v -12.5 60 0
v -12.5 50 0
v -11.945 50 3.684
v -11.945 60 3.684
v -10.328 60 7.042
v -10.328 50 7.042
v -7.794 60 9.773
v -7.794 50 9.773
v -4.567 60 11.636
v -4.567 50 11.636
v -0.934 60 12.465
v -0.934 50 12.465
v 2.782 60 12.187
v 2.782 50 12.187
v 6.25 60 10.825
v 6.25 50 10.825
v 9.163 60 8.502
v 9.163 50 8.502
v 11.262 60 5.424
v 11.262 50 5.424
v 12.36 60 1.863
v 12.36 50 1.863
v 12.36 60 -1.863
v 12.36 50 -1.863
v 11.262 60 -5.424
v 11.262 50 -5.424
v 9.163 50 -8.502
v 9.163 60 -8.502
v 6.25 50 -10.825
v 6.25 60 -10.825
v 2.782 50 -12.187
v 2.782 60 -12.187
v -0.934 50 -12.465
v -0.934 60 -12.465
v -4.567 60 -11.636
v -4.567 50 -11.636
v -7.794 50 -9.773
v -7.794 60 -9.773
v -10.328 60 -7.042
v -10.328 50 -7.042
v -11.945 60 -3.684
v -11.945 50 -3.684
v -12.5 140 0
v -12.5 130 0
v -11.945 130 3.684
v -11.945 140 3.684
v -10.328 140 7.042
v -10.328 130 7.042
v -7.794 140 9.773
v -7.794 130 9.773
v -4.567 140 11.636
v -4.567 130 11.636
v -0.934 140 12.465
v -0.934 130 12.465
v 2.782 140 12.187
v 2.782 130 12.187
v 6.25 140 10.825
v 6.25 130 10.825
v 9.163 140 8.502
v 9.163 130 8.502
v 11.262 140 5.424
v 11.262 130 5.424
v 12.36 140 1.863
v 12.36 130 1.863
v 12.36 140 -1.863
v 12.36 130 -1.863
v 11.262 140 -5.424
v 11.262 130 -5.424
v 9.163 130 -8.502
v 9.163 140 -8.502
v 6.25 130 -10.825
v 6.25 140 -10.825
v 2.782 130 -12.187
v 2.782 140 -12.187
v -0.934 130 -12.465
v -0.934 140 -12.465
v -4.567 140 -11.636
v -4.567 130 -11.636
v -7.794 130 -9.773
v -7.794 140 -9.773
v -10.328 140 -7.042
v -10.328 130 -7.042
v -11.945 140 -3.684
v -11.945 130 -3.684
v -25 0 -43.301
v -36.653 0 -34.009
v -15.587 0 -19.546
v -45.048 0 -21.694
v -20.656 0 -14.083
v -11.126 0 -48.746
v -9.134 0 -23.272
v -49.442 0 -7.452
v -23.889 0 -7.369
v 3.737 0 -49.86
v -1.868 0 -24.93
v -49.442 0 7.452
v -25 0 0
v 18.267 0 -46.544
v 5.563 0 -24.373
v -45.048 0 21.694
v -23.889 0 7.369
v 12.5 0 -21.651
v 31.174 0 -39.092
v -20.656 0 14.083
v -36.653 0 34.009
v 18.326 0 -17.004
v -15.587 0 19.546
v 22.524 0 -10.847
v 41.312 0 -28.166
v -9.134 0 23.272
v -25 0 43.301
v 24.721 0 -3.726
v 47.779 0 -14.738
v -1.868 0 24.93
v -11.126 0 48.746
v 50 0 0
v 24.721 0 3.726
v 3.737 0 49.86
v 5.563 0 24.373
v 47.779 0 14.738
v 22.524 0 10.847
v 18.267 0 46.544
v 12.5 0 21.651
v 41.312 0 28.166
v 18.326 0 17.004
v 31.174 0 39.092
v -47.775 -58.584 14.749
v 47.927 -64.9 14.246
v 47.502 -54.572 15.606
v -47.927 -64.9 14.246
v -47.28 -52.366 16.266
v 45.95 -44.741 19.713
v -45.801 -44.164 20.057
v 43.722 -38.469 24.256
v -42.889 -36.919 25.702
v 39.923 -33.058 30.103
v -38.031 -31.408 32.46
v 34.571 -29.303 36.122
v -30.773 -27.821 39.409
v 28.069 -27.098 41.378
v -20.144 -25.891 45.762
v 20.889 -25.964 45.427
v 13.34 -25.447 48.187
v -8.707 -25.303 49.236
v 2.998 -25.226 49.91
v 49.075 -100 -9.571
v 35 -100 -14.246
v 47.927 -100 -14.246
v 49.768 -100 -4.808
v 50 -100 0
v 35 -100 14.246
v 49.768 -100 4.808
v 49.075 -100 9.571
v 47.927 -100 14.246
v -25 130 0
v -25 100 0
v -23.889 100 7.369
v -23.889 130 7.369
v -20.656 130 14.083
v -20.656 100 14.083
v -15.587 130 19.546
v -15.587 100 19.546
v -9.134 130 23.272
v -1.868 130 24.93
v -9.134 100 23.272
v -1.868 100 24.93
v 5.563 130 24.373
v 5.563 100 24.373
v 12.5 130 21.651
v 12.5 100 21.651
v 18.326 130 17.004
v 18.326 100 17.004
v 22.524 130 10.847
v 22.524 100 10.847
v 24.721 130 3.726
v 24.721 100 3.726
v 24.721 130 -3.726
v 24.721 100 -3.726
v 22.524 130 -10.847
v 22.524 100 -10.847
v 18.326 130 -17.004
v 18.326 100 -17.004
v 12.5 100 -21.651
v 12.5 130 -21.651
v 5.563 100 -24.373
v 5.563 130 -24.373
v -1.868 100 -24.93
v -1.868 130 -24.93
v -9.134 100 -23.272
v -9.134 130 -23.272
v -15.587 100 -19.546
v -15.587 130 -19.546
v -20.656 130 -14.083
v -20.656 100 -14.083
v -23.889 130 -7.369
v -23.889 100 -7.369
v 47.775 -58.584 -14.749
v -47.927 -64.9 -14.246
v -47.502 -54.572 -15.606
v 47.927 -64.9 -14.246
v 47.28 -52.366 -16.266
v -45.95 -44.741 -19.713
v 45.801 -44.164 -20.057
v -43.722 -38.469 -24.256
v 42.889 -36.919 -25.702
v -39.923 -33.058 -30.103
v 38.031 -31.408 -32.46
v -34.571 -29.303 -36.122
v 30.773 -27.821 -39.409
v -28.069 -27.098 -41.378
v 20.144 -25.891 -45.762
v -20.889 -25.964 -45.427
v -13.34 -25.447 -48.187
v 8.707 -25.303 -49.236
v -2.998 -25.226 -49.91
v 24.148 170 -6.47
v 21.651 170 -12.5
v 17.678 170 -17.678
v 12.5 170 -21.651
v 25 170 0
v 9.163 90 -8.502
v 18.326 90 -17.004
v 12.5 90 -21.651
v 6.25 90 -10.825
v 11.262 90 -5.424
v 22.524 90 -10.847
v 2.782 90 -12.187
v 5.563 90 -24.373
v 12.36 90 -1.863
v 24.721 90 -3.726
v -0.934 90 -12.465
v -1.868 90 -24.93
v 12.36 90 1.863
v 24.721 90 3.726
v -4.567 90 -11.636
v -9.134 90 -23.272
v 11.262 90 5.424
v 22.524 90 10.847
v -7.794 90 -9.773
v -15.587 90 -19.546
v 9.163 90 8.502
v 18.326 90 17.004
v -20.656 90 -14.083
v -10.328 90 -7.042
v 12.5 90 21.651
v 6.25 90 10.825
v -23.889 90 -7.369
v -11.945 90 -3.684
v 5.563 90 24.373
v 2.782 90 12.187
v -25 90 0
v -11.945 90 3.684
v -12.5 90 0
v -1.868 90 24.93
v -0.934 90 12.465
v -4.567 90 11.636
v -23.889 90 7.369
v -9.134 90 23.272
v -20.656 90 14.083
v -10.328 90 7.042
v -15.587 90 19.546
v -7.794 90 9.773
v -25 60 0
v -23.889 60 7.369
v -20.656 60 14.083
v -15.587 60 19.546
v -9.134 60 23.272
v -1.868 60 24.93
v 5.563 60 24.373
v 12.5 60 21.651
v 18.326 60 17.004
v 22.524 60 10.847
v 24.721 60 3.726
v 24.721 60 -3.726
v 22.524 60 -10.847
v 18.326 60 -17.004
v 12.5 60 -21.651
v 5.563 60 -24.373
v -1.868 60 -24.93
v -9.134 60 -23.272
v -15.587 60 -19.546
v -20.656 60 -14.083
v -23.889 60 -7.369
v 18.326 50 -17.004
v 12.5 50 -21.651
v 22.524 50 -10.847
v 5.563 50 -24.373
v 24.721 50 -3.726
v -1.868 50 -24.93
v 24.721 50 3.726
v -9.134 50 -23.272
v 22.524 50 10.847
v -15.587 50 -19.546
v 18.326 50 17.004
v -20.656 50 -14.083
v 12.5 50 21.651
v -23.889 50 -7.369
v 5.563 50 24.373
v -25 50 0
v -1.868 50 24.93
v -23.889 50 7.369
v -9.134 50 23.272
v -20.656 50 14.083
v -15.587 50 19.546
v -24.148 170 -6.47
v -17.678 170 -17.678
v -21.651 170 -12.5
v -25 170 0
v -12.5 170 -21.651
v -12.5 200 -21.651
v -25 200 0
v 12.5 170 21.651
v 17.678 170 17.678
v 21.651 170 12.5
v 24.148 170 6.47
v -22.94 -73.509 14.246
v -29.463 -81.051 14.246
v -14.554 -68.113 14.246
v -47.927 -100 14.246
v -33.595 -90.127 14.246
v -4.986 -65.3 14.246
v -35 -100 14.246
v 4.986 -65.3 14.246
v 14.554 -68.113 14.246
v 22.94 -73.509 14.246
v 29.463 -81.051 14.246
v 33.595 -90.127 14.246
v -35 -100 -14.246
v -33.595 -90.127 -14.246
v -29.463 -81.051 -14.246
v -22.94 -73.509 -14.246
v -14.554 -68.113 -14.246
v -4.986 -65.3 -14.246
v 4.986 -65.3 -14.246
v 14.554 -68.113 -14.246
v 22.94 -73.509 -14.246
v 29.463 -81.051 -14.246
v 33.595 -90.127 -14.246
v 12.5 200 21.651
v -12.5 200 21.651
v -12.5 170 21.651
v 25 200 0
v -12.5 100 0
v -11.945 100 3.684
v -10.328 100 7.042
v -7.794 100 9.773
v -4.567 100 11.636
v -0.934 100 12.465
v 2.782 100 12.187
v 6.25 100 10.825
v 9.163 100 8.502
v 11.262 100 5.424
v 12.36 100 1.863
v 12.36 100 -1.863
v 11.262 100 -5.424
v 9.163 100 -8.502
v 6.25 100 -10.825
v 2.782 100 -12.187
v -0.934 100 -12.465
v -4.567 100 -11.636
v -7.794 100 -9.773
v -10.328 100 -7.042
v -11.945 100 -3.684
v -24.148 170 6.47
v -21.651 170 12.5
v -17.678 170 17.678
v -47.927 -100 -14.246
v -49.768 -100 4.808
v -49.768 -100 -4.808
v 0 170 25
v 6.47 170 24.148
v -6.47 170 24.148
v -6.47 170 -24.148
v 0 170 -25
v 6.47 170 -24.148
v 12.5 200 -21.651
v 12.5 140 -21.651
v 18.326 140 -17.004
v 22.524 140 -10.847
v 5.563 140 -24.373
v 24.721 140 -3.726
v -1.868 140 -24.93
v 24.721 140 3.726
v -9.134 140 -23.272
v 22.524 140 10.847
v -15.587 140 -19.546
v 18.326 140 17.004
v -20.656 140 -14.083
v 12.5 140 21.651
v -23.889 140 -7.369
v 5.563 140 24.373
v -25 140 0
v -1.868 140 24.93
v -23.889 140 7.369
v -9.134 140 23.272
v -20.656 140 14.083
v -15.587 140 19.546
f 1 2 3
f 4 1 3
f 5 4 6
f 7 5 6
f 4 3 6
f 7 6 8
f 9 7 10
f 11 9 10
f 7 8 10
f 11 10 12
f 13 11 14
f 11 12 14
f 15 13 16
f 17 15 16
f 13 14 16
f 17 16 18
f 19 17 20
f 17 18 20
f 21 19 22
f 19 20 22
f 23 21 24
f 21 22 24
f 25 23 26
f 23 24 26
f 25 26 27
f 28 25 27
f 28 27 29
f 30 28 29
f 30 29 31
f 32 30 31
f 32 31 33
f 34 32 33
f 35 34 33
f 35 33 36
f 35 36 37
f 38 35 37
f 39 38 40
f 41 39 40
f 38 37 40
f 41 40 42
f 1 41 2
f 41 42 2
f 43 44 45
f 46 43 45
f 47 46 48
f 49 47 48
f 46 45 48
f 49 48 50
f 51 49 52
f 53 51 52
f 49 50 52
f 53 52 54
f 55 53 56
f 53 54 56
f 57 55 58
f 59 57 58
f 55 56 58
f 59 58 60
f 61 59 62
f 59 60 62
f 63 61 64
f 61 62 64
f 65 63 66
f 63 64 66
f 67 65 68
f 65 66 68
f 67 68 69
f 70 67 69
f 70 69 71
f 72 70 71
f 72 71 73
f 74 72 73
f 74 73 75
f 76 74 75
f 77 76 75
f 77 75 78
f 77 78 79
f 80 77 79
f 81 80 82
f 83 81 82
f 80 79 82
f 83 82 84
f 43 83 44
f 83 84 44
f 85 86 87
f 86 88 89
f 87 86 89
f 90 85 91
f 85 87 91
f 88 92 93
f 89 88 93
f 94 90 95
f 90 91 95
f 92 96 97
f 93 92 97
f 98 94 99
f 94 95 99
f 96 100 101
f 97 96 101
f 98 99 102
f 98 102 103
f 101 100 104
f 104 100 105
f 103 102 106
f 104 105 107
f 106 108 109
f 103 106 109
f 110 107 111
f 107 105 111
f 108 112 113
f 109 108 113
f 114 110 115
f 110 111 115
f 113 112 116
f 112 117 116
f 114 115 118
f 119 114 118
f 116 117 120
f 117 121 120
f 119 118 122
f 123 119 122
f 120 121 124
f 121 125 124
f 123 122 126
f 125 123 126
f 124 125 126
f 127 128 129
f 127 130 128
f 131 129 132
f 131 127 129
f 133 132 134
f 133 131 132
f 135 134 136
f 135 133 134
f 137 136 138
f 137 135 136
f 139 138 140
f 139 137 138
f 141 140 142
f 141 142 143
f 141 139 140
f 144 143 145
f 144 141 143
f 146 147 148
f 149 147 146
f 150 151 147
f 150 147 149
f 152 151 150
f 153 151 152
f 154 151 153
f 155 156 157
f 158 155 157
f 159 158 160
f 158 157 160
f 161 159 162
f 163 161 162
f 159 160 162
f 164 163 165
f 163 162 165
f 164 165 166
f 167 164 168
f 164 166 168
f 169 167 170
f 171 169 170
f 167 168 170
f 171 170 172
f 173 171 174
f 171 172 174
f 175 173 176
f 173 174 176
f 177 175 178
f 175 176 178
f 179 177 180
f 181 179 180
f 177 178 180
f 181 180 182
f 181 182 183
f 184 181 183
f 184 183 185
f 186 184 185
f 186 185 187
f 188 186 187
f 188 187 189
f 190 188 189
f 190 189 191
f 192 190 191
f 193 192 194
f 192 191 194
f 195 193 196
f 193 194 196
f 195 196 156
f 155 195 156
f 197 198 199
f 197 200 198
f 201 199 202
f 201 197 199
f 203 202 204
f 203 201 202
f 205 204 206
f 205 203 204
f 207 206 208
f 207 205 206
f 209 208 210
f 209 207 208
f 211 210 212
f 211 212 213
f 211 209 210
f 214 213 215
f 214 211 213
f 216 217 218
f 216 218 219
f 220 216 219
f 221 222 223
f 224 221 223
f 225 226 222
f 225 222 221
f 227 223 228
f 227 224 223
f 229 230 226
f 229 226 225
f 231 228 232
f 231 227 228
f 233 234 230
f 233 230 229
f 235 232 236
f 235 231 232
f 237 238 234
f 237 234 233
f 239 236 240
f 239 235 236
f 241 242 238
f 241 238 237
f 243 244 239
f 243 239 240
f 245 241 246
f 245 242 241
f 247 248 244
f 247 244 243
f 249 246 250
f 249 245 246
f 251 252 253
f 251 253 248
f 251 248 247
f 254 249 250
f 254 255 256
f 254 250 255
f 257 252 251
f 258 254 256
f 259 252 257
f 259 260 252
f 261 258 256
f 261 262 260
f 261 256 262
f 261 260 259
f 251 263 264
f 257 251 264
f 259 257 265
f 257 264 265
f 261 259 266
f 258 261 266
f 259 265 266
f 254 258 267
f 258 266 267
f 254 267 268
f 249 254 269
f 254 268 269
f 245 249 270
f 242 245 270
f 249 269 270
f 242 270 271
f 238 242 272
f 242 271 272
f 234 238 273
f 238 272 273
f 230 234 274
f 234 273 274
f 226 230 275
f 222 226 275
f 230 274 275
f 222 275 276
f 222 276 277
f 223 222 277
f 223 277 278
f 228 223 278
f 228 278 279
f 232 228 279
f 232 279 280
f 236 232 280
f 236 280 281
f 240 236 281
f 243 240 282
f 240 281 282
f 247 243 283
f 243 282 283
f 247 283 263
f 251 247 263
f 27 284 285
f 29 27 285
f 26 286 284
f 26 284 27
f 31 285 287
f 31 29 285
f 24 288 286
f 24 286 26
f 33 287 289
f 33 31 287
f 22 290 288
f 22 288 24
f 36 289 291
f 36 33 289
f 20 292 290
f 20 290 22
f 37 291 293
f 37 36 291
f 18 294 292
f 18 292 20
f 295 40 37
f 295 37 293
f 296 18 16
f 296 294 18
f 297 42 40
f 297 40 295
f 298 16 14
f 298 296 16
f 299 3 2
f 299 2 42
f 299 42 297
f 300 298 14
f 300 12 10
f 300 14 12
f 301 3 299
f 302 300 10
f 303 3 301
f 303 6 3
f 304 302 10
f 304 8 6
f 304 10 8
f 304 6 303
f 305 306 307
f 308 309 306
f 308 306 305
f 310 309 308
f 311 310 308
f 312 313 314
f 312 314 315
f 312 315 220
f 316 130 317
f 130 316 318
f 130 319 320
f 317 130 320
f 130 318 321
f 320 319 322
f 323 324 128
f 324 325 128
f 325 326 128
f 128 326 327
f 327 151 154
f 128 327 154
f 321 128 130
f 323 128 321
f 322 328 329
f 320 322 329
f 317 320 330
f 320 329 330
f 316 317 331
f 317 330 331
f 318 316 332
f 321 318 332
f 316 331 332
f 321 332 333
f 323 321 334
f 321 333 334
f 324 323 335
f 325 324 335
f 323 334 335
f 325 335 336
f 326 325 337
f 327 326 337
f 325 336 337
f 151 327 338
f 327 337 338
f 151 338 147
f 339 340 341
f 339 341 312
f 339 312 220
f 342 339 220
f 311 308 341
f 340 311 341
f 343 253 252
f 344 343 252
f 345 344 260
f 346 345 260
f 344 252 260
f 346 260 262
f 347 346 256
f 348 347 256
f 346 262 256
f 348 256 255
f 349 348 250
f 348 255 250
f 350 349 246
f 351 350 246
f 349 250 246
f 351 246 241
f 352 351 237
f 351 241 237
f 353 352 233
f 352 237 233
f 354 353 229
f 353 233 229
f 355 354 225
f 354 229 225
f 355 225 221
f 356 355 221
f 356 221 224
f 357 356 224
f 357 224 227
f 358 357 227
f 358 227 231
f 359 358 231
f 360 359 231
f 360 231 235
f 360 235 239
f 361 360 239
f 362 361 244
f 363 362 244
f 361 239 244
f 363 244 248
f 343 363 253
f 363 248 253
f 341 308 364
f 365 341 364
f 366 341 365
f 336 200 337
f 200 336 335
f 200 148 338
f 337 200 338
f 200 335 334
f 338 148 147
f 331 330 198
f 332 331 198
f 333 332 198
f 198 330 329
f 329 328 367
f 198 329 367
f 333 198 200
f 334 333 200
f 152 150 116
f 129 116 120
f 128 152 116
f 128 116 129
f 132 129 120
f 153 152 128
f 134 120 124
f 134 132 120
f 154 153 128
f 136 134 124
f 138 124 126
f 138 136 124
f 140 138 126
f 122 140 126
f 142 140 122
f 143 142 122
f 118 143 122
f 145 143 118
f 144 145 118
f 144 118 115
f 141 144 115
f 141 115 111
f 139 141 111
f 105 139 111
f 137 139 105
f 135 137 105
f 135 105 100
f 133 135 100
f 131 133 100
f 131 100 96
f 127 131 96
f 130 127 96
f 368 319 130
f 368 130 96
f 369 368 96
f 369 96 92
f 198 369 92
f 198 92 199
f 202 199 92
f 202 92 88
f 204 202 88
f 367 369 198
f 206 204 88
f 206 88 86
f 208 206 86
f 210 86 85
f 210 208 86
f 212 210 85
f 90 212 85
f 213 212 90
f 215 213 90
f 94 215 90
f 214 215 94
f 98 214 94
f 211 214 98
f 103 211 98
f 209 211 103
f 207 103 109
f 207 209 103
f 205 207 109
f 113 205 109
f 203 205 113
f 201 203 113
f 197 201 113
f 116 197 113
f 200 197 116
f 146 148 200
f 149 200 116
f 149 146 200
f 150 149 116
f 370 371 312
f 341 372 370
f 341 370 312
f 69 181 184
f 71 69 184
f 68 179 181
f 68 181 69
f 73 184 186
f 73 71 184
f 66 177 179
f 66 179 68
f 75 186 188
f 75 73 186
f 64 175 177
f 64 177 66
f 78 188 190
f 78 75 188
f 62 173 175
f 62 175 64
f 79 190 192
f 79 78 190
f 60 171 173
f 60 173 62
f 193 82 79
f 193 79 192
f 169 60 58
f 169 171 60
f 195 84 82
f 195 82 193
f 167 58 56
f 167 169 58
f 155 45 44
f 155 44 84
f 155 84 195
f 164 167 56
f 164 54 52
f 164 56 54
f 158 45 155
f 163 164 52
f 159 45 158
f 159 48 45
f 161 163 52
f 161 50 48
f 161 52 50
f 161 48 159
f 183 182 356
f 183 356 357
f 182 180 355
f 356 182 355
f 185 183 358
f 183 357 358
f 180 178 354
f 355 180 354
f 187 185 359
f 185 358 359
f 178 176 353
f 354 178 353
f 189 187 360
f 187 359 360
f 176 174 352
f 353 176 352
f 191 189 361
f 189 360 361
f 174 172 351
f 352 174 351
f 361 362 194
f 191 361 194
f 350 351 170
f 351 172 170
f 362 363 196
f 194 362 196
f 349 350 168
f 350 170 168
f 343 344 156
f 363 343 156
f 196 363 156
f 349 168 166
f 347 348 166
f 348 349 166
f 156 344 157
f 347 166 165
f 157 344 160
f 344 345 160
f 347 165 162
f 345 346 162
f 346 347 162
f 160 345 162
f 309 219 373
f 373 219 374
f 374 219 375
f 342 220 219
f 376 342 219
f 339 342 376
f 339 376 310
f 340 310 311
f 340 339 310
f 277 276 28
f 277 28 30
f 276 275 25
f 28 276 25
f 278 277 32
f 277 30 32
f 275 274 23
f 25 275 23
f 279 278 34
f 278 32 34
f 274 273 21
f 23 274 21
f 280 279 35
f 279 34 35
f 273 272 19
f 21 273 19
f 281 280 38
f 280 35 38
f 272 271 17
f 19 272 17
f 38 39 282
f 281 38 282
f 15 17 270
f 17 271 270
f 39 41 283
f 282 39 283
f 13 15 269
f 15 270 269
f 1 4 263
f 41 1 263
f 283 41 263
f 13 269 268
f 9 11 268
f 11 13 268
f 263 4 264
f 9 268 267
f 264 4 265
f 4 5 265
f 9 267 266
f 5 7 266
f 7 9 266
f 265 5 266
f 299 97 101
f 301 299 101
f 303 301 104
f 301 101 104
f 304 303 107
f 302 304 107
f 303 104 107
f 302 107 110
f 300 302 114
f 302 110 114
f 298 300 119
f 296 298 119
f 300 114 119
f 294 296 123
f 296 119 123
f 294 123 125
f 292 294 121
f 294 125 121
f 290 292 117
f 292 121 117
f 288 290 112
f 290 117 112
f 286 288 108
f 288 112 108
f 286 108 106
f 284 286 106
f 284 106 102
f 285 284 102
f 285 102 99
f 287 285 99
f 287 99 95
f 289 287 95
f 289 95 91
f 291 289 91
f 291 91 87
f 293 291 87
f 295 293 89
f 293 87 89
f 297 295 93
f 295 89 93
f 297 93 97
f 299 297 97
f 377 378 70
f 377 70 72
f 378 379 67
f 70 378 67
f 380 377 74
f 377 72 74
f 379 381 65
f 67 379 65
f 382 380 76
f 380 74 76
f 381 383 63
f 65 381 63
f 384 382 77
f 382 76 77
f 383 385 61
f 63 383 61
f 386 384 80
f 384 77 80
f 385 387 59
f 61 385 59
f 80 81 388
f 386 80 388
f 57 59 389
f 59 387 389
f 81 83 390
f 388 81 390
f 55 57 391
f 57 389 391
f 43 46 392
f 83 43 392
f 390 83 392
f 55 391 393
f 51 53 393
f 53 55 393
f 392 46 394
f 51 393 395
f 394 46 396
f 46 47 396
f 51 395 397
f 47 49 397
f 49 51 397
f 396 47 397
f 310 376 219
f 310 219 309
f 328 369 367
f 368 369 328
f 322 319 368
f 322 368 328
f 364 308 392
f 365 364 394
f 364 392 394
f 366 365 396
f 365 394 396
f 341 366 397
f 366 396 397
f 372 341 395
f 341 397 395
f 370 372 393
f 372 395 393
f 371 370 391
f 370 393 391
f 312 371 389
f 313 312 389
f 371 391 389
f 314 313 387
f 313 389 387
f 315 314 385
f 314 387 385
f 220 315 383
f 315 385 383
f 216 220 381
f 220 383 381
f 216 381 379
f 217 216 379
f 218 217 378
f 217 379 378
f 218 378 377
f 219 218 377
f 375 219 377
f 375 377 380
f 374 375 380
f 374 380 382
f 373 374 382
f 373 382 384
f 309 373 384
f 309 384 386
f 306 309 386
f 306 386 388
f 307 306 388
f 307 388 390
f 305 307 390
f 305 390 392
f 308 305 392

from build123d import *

# Parameters (mm, degrees)
F0_R          = 50
F1_DEPTH      = 100
F2_R          = 25
F3_DEPTH      = 50
F4_R          = 12.5
F5_DEPTH      = 10
F6_R          = 25
F7_DEPTH      = 30
F8_R          = 12.5
F9_DEPTH      = 10
F10_R         = 25
F11_DEPTH     = 30
F12_R         = 12.5
F13_DEPTH     = 10
F14_R         = 25
F15_DEPTH     = 30
F17_DEPTH     = 30
F20_D         = 70
F22_DEPTH     = 75
F23_T4_DEPTH  = 295.3549985752
F23_S5_R      = 50
F23_T6_DEPTH  = 152
F23_T10_DEPTH = 295.3549985752
F23_S11_R     = 50
F23_T12_DEPTH = 152


# Not quite as in the source:
# - a fillet or chamfer that OpenCascade refuses, or shapes differently, is made with other operations: its cross-section is extruded or revolved along the edge and cut away or added


with BuildPart() as f1:
    # F0 (on Front) → F1 (new body)
    with BuildSketch(Plane.XZ):
        Circle(F0_R)
    extrude(amount=F1_DEPTH)

    # F2 (on face) → F3 (join)
    with BuildSketch(Plane(origin=(0, 0, 0), x_dir=(-1, 0, 0), z_dir=(0, 1, 0))):
        Circle(F2_R)
    extrude(amount=F3_DEPTH)

    # F4 (on face) → F5 (join)
    with BuildSketch(Plane(origin=(0, 50, 0), x_dir=(-1, 0, 0), z_dir=(0, 1, 0))):
        Circle(F4_R)
    extrude(amount=F5_DEPTH)

    # F6 (on face) → F7 (join)
    with BuildSketch(Plane(origin=(0, 60, 0), x_dir=(-1, 0, 0), z_dir=(0, 1, 0))):
        Circle(F6_R)
    extrude(amount=F7_DEPTH)

    # F8 (on face) → F9 (join)
    with BuildSketch(Plane(origin=(0, 90, 0), x_dir=(-1, 0, 0), z_dir=(0, 1, 0))):
        Circle(F8_R)
    extrude(amount=F9_DEPTH)

    # F10 (on face) → F11 (join)
    with BuildSketch(Plane(origin=(0, 100, 0), x_dir=(-1, 0, 0), z_dir=(0, 1, 0))):
        Circle(F10_R)
    extrude(amount=F11_DEPTH)

    # F12 (on face) → F13 (join)
    with BuildSketch(Plane(origin=(0, 130, 0), x_dir=(-1, 0, 0), z_dir=(0, 1, 0))):
        Circle(F12_R)
    extrude(amount=F13_DEPTH)

    # F14 (on face) → F15 (join)
    with BuildSketch(Plane(origin=(0, 140, 0), x_dir=(-1, 0, 0), z_dir=(0, 1, 0))):
        Circle(F14_R)
    extrude(amount=F15_DEPTH)

    # F16 (on face) → F17 (join)
    with BuildSketch(Plane(origin=(0, 170, 0), x_dir=(-1, 0, 0), z_dir=(0, 1, 0))):
        Polygon((12.5, -21.6506350946), (25, 0), (12.5, 21.6506350946), (-12.5, 21.6506350946), (-25, 0), (-12.5, -21.6506350946), align=None)
    extrude(amount=F17_DEPTH)

    # F20 (through all)
    with Locations(Plane.XY.offset(50)):
        with Locations((0, -99.9434366822)):
            Hole(F20_D / 2)

    # F21 (on face) → F22 (cut)
    with BuildSketch(Plane.XZ.offset(100)):
        with BuildLine():
            ThreePointArc((47.9274992876, 14.2462209739), (0, 50), (-47.9274992876, 14.2462209739))
            Line((-47.9274992876, 14.2462209739), (47.9274992876, 14.2462209739))
        make_face()
        with BuildLine():
            Line((47.9274992876, -14.2462209739), (-47.9274992876, -14.2462209739))
            ThreePointArc((-47.9274992876, -14.2462209739), (0, -50), (47.9274992876, -14.2462209739))
        make_face()
    extrude(amount=-F22_DEPTH, mode=Mode.SUBTRACT)

    # F23: fillet of radius 39.9 on 2 edges, made by hand


with BuildPart() as f23_tool2:
    # F23_s3 → F23_t4 (new body)
    with BuildSketch(Plane.YZ.offset(-147.6774992876)):
        with BuildLine():
            ThreePointArc((-64.9, 14.2462209739), (-36.6864394307, 25.9326604046), (-25, 54.1462209739))
            Line((-25, 54.1462209739), (-25, 14.2462209739))
            Line((-25, 14.2462209739), (-64.9, 14.2462209739))
        make_face()
    extrude(amount=F23_T4_DEPTH)

    # F23_s5 → F23_t6 (intersect, symmetric)
    with BuildSketch(Plane.XZ.offset(44.9)):
        Circle(F23_S5_R)
    extrude(amount=F23_T6_DEPTH, both=True, mode=Mode.INTERSECT)


with BuildPart() as f1_1:
    add(f1.part)

    # F23_t1: union F23_tool2
    add(f23_tool2.part)


with BuildPart() as f23_tool8:
    # F23_s9 → F23_t10 (new body)
    with BuildSketch(Plane.YZ.offset(147.6774992876)):
        with BuildLine():
            ThreePointArc((-64.9, -14.2462209739), (-36.6864394307, -25.9326604046), (-25, -54.1462209739))
            Line((-25, -54.1462209739), (-25, -14.2462209739))
            Line((-25, -14.2462209739), (-64.9, -14.2462209739))
        make_face()
    extrude(amount=-F23_T10_DEPTH)

    # F23_s11 → F23_t12 (intersect, symmetric)
    with BuildSketch(Plane.XZ.offset(44.9)):
        Circle(F23_S11_R)
    extrude(amount=F23_T12_DEPTH, both=True, mode=Mode.INTERSECT)


with BuildPart() as f1_2:
    add(f1_1.part)

    # F23_t7: union F23_tool8
    add(f23_tool8.part)


solid = f1_2.part
